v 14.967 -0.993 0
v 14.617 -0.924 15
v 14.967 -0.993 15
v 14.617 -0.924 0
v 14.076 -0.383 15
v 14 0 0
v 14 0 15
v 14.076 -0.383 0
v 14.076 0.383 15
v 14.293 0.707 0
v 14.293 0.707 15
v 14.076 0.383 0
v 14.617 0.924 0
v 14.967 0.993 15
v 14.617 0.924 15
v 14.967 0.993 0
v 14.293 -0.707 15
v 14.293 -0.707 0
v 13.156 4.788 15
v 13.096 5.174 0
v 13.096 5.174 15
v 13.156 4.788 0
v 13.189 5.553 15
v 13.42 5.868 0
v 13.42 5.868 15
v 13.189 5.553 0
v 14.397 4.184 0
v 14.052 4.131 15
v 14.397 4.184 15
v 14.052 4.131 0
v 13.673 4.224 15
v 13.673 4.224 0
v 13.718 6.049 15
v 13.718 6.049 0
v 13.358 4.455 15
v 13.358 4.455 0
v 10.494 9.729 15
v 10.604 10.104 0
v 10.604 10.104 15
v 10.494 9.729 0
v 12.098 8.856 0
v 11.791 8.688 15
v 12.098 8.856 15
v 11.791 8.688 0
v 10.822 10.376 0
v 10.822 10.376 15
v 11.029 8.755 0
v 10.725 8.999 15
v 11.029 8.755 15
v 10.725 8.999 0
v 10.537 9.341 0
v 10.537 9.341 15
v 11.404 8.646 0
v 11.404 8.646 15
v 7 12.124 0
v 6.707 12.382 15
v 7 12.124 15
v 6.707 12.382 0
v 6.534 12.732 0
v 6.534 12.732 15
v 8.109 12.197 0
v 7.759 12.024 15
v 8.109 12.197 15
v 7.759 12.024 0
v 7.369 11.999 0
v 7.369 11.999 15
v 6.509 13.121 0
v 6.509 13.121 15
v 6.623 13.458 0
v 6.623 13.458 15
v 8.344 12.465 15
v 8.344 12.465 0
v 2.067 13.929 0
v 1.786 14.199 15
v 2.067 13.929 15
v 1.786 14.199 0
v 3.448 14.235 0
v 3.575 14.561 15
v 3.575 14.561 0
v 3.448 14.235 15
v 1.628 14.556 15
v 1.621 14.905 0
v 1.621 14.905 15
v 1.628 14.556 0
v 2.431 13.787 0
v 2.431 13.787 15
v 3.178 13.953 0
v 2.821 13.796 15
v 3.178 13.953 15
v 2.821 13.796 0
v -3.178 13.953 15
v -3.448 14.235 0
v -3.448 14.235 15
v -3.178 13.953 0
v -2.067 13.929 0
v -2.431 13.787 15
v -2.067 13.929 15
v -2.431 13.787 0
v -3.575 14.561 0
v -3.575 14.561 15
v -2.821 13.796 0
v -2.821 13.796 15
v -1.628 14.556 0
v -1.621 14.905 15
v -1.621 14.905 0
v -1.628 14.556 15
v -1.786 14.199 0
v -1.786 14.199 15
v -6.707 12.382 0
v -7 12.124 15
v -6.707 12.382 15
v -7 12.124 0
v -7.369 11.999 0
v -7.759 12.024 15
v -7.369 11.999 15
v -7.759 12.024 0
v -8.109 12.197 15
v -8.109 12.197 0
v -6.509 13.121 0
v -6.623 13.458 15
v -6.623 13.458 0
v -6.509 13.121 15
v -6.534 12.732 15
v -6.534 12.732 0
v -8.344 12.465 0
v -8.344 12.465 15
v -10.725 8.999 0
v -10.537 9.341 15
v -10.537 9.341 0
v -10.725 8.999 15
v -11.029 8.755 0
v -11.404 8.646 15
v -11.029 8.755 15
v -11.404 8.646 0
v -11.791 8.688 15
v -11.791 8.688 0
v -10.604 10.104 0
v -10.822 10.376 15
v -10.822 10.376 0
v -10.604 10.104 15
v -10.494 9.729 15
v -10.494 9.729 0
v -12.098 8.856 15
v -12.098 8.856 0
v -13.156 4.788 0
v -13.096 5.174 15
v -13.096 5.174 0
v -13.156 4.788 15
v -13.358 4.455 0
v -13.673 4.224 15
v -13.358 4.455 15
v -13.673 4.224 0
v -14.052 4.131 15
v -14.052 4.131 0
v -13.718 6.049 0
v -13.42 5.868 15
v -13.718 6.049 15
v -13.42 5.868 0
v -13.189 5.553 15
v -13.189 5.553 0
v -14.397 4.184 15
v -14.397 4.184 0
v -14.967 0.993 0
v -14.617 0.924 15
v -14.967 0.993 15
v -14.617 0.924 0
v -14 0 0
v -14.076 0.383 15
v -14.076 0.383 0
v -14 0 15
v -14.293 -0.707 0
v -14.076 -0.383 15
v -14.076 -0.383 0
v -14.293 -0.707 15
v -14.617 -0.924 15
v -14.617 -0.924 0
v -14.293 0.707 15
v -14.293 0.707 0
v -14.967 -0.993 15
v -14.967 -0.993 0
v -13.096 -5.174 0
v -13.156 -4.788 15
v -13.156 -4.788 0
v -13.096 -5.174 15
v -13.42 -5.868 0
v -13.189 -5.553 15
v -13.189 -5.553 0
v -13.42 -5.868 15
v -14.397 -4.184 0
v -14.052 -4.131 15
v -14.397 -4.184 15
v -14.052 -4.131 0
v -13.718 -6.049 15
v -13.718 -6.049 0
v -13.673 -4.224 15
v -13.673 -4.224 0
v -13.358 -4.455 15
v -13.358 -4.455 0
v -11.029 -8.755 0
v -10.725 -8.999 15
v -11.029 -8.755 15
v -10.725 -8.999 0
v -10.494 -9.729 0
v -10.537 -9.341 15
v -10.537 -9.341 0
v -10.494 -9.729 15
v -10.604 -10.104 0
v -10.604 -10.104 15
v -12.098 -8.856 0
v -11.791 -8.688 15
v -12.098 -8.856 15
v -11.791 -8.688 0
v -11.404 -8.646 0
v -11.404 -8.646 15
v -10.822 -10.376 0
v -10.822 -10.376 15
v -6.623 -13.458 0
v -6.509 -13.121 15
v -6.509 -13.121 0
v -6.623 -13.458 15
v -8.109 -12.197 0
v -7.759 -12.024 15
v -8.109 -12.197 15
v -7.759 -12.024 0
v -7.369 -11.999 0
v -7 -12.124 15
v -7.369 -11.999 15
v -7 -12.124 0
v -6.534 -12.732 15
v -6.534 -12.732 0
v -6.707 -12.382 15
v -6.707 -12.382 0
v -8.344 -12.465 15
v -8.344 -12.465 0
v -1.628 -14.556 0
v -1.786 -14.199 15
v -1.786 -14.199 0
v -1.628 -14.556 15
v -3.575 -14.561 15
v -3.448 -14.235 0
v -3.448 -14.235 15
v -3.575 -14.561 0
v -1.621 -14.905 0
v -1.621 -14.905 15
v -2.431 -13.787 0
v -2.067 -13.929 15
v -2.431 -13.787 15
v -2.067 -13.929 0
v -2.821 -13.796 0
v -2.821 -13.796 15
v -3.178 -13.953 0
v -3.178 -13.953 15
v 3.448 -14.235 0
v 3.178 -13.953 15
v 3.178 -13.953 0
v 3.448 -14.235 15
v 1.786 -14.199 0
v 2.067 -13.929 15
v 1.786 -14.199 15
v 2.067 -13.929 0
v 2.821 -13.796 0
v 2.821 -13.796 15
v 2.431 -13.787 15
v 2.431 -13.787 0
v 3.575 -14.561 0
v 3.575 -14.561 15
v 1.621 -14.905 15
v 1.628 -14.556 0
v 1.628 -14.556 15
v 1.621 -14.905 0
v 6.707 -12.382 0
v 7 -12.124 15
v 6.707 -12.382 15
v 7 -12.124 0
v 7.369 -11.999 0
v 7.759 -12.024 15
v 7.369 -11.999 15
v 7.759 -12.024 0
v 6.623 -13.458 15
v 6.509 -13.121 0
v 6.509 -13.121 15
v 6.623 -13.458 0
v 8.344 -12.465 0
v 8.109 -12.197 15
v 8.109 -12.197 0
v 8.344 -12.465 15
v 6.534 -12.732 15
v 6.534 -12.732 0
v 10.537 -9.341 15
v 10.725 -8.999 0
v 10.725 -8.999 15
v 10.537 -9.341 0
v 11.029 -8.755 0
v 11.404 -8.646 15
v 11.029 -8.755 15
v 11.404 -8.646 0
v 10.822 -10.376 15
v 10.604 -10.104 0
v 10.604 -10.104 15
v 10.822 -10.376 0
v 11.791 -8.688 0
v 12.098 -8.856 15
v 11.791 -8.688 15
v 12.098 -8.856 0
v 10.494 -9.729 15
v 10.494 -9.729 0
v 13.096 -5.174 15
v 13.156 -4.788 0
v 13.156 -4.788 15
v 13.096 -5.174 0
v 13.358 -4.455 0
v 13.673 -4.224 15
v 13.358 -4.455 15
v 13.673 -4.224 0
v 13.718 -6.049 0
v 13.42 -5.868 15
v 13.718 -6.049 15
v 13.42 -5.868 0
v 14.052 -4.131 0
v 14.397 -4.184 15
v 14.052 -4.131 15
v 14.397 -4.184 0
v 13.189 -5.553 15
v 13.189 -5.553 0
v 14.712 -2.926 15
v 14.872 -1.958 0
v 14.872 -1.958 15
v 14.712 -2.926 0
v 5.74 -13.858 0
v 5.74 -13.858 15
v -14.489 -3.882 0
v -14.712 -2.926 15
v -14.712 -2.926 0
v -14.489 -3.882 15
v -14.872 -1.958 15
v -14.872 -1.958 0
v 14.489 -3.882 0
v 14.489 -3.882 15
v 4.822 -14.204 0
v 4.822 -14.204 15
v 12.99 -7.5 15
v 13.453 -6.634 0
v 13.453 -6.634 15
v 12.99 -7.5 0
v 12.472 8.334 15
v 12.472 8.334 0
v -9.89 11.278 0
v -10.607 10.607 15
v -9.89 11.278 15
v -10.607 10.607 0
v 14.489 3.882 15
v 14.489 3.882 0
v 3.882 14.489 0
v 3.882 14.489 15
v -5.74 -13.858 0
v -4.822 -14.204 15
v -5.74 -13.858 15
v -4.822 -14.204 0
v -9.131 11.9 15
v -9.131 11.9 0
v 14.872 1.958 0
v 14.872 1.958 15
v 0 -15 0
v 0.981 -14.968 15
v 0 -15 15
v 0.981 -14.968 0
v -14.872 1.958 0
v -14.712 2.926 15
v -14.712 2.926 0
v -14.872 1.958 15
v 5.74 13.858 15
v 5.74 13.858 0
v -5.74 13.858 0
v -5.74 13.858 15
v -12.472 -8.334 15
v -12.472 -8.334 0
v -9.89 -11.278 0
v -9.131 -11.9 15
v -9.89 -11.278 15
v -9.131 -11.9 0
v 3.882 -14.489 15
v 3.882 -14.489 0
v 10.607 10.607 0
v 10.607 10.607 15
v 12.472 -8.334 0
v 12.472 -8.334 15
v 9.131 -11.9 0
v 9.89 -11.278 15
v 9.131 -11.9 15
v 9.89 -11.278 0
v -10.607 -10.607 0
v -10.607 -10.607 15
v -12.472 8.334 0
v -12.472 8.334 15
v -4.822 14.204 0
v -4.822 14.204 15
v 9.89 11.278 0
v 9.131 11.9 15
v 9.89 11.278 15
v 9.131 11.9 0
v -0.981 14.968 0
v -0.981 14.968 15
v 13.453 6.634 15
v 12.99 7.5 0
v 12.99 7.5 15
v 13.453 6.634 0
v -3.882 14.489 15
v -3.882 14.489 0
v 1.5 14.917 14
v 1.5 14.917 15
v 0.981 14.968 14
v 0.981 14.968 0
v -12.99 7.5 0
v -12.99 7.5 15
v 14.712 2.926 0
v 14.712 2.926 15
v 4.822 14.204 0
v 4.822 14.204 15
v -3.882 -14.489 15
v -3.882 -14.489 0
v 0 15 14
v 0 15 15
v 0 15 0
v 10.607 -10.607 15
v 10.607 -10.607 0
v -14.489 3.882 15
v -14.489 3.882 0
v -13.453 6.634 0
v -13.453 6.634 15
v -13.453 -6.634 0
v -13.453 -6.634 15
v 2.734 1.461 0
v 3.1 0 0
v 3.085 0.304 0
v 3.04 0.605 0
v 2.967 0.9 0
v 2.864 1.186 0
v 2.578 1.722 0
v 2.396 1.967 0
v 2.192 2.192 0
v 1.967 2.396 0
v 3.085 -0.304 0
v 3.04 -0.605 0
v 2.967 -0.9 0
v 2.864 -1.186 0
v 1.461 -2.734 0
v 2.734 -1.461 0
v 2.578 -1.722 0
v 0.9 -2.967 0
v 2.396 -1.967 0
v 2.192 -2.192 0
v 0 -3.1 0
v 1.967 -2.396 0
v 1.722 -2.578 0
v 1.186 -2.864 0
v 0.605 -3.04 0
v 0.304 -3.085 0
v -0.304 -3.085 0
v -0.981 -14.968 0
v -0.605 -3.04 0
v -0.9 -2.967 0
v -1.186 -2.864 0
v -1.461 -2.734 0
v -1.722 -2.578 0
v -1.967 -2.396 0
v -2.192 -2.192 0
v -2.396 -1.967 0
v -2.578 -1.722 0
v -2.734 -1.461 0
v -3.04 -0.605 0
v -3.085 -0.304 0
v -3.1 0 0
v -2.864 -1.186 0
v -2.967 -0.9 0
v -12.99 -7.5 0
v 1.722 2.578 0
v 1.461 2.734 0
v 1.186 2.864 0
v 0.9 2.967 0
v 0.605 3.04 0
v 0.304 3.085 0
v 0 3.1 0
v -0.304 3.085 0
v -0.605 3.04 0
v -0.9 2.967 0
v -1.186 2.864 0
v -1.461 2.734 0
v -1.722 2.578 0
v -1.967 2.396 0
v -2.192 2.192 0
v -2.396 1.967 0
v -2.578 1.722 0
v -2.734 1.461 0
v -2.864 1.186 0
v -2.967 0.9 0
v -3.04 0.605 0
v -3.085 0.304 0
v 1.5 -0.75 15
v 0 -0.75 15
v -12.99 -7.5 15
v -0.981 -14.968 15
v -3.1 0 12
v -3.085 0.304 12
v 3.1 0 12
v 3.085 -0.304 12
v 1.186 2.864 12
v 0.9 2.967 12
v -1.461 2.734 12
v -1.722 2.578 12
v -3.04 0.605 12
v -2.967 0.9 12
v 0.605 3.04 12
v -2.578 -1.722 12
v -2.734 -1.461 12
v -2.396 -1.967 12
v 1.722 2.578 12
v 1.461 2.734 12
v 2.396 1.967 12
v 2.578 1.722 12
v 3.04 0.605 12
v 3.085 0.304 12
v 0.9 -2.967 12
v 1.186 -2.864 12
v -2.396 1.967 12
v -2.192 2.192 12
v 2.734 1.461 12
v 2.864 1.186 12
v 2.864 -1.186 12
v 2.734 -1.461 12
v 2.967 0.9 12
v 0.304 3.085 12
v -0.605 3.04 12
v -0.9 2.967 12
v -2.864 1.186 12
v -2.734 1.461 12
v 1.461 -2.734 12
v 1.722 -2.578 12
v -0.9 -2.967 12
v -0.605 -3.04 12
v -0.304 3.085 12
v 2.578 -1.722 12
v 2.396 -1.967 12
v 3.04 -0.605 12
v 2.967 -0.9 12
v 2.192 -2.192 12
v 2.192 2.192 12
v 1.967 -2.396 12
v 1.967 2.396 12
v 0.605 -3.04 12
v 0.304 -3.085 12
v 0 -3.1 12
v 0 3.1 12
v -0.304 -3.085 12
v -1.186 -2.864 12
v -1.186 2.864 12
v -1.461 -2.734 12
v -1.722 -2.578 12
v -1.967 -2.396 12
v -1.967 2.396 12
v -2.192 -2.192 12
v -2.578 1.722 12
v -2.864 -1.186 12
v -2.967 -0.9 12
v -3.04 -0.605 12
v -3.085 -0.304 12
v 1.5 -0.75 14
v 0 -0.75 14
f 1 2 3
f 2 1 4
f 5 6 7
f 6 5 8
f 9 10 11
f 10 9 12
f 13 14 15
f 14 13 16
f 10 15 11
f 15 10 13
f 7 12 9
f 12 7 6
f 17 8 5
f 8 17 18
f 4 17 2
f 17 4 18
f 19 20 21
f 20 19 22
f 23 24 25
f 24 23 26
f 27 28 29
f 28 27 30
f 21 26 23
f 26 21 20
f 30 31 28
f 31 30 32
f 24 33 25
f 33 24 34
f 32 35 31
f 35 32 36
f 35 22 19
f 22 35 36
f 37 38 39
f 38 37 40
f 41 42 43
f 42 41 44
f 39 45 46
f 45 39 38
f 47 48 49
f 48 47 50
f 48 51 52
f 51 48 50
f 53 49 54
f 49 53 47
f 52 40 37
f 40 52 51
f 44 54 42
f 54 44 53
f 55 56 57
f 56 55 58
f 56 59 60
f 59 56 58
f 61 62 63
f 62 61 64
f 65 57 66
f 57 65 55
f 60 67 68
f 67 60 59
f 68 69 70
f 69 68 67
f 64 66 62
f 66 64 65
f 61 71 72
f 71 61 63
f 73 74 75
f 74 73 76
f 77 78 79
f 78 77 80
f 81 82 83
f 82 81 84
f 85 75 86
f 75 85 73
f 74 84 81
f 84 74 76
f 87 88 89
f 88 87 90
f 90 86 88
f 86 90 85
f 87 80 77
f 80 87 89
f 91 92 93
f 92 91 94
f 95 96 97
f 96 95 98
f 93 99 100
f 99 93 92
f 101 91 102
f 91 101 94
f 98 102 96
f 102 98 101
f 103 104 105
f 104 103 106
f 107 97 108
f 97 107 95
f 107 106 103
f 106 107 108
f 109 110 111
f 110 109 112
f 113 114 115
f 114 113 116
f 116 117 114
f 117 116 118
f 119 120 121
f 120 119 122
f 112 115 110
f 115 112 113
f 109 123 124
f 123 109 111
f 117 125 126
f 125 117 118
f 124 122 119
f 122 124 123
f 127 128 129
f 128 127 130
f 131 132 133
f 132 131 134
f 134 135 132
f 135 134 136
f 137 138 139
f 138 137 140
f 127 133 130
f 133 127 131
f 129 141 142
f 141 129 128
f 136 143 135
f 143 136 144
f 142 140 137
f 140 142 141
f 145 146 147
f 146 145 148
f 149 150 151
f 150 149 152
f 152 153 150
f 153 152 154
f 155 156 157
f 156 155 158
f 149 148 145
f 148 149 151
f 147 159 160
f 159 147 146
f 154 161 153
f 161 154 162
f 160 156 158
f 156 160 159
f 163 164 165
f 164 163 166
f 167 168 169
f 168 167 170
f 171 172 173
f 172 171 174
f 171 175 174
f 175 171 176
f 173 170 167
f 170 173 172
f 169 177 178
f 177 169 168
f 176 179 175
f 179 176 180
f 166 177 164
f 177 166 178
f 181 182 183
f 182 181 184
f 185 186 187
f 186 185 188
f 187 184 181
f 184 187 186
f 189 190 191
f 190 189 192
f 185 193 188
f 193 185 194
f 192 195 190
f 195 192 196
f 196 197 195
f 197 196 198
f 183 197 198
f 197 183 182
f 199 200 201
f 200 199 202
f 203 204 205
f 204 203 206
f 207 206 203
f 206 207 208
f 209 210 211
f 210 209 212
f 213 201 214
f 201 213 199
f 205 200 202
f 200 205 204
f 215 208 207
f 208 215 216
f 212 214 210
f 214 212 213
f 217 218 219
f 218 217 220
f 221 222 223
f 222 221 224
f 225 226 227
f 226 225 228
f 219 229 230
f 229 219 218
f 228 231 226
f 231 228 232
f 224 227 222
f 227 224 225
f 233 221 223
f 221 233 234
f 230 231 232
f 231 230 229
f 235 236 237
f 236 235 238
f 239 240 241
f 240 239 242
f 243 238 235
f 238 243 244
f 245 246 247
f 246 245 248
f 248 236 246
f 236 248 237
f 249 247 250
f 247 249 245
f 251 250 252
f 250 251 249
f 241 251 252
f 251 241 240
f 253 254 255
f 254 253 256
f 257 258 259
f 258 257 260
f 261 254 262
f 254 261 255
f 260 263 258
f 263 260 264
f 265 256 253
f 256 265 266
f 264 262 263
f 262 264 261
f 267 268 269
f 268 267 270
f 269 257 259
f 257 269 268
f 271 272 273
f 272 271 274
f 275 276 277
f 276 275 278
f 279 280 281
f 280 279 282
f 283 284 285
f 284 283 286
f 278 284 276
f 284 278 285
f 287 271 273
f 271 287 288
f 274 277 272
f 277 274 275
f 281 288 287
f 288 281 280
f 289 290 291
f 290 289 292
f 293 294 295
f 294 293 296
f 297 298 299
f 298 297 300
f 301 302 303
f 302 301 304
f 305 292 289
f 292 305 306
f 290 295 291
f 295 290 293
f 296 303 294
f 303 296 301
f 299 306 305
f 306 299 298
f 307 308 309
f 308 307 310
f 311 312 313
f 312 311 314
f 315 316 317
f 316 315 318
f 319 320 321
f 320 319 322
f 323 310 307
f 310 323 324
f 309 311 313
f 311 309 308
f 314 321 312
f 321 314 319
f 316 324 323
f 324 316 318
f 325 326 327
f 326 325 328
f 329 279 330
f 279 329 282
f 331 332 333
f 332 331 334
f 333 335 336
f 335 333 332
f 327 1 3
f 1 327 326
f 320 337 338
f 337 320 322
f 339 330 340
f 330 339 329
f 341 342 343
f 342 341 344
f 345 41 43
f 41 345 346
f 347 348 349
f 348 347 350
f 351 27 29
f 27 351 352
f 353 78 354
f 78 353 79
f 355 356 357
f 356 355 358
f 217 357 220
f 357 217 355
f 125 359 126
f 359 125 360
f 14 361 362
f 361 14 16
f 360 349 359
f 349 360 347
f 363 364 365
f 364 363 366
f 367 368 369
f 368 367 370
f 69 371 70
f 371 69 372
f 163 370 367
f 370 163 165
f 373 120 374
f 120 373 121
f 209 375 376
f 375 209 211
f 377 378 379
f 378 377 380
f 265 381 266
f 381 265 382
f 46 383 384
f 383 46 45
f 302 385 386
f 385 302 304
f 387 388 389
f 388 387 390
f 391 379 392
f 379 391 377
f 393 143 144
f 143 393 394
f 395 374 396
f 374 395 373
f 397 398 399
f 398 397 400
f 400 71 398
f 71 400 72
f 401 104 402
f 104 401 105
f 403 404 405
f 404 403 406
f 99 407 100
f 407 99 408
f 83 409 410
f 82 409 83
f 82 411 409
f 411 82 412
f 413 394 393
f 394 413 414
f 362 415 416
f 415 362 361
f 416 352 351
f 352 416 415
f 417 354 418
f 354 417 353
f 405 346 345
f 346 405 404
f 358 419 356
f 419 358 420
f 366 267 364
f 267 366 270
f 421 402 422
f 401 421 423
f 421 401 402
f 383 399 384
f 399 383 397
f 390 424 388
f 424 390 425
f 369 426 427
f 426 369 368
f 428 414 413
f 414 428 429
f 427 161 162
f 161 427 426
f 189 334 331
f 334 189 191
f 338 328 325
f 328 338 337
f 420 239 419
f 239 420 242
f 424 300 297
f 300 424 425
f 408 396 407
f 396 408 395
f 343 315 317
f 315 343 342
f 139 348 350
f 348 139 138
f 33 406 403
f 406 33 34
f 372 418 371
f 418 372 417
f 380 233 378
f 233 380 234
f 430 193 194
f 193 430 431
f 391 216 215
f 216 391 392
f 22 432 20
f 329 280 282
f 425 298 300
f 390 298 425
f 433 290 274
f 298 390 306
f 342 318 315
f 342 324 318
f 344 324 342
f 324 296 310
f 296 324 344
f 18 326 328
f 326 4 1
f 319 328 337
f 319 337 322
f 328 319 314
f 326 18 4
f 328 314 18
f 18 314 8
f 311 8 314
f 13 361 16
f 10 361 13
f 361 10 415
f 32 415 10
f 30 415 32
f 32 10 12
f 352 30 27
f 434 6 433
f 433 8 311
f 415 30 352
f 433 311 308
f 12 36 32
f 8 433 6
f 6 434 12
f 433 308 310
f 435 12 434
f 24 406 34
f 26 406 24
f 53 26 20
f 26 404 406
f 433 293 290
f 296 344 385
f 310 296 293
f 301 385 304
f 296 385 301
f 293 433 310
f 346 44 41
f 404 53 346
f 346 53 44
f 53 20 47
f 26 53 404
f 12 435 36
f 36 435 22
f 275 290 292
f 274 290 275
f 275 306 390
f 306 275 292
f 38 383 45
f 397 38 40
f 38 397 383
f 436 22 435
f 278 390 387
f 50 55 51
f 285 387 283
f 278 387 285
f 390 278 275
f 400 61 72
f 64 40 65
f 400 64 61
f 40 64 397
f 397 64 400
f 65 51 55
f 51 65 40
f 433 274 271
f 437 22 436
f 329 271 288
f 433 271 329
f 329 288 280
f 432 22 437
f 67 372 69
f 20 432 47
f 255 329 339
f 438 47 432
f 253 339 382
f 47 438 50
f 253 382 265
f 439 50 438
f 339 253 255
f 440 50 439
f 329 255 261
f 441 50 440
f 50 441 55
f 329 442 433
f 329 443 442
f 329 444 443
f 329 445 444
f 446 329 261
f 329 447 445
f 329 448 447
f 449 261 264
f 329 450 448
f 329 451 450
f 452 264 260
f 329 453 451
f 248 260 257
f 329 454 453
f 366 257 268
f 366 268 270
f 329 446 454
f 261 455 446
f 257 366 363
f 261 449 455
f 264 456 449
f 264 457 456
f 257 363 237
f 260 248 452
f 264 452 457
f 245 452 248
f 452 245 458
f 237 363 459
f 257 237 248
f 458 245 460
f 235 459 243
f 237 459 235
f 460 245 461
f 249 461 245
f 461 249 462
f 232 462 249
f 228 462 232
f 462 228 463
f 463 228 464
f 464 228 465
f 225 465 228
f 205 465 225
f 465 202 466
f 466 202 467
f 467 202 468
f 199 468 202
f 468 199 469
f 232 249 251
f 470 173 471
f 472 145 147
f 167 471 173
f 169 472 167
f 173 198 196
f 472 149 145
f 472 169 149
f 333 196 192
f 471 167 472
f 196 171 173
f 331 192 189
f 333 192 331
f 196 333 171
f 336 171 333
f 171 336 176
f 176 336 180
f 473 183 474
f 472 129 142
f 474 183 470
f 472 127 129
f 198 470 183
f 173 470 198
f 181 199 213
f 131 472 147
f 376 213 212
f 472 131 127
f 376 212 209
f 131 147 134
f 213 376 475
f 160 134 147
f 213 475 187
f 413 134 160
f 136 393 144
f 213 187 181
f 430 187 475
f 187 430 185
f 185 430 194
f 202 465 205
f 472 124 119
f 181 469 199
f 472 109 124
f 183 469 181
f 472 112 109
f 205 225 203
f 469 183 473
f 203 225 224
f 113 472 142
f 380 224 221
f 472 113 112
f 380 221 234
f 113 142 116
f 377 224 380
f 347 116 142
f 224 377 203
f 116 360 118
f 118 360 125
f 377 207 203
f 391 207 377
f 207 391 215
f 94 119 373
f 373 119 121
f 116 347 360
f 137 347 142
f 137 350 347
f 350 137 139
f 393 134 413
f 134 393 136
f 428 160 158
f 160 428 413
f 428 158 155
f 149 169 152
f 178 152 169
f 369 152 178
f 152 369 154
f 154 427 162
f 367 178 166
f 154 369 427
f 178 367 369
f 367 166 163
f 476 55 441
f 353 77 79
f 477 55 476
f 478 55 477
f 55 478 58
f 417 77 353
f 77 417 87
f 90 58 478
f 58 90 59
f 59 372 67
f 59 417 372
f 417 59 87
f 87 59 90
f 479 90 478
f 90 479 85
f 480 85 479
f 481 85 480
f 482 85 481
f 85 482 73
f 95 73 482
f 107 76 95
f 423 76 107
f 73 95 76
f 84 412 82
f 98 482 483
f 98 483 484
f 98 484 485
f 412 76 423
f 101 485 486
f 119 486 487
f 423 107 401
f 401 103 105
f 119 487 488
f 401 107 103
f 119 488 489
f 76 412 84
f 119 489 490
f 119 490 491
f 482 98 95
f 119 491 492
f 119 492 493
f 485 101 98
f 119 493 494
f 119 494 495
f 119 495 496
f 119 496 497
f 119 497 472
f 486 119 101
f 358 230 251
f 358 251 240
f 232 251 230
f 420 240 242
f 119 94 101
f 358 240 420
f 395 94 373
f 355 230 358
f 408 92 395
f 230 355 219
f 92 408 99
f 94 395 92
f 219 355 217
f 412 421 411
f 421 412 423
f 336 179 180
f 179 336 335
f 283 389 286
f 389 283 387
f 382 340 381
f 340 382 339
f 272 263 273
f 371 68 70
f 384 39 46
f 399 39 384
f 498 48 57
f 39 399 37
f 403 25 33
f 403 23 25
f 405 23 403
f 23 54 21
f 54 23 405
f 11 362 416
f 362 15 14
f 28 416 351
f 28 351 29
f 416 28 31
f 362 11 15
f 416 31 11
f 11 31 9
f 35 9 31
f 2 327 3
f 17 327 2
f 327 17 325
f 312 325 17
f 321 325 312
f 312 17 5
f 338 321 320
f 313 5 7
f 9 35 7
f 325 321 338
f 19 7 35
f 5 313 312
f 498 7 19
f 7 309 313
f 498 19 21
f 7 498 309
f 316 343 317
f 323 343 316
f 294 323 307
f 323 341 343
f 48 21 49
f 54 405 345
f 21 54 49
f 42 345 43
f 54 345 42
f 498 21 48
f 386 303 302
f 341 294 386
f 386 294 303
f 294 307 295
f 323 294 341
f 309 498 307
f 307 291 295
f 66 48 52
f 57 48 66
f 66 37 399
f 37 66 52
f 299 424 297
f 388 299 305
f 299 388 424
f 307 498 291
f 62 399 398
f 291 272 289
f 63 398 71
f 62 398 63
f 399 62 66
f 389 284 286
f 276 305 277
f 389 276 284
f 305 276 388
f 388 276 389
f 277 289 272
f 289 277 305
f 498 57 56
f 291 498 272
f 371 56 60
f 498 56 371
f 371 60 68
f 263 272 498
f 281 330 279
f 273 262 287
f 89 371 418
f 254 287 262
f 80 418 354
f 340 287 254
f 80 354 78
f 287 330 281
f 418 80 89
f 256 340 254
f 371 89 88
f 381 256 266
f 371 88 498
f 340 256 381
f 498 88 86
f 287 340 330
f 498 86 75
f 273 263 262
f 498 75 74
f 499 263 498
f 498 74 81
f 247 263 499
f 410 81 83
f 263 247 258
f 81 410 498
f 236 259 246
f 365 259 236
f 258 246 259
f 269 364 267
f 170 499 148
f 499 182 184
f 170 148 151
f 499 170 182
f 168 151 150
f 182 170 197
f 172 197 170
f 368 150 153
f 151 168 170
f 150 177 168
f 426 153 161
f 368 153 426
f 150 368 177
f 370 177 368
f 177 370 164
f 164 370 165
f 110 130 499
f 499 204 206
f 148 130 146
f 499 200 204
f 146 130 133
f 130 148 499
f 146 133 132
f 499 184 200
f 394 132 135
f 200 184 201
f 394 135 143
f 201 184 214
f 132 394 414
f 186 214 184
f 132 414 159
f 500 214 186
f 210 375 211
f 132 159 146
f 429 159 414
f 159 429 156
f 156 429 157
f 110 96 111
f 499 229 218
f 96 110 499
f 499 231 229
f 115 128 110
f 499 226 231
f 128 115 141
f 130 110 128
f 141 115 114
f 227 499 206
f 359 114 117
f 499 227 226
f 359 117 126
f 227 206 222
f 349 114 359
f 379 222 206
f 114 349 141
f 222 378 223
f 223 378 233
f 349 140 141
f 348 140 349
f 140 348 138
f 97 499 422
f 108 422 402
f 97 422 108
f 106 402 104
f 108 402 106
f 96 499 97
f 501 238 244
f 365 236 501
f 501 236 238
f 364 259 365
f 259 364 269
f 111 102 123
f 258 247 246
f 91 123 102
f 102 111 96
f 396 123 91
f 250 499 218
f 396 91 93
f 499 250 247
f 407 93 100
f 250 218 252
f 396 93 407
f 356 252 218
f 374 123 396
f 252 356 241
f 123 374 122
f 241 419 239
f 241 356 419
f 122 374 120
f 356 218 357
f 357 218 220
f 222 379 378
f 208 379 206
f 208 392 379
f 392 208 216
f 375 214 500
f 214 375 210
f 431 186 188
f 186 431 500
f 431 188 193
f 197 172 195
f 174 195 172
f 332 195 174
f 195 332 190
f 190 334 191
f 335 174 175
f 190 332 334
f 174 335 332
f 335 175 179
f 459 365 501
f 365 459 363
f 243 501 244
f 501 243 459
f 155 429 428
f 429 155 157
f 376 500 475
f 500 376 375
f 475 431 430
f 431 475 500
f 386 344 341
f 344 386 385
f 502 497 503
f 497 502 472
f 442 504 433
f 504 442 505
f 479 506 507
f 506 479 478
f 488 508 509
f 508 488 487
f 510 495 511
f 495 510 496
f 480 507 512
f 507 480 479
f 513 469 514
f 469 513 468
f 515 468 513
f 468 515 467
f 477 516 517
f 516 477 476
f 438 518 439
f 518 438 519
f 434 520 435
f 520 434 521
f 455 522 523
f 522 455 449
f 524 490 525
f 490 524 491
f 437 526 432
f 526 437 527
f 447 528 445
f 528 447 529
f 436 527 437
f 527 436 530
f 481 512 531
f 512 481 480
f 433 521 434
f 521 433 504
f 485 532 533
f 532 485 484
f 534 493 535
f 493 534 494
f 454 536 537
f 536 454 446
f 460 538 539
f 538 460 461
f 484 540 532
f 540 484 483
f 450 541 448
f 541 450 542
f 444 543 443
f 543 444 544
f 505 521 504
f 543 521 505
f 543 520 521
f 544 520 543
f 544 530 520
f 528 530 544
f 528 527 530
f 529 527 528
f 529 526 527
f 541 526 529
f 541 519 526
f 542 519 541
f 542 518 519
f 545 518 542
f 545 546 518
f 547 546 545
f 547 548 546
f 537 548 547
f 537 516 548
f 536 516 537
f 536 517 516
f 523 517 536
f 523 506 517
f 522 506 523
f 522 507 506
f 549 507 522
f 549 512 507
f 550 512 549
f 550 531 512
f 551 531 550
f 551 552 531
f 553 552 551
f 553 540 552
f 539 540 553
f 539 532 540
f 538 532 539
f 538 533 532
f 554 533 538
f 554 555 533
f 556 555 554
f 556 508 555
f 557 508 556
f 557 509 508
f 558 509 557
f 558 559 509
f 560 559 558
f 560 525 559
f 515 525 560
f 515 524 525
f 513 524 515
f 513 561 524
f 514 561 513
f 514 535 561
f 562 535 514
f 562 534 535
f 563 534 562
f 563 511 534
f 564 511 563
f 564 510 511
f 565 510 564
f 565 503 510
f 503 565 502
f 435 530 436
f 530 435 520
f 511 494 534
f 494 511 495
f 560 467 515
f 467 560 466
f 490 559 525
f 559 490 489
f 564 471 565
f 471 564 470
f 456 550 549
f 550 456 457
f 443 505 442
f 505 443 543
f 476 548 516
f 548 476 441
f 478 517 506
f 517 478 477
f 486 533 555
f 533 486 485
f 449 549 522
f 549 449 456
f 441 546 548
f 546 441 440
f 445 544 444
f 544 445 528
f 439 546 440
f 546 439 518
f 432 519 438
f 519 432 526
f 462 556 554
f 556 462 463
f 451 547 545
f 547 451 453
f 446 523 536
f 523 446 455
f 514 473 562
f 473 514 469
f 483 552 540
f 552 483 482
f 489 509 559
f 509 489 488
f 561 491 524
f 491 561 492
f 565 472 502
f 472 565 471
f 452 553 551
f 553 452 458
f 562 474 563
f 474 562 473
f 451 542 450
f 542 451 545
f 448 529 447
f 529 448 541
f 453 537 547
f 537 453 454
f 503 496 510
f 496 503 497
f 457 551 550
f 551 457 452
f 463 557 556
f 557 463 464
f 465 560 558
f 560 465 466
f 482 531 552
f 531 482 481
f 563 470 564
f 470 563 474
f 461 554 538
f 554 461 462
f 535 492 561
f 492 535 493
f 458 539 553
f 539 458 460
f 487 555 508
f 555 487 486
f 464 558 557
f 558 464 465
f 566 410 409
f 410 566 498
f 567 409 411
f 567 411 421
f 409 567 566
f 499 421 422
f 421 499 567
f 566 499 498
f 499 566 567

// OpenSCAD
// Replacement knob for hotplate stirrer with D-shaft
// Print orientation: bottom face (shaft bore) on the bed (z = 0)

// ---------------- Parameters ----------------
knob_d        = 30;    // knob outer diameter
knob_h        = 15;    // knob height
shaft_d       = 6.2;   // D-shaft diameter
bore_depth    = 12;    // blind bore depth from bottom face
bore_flat     = 4.7;   // distance from D-bore flat to opposite side
groove_count  = 18;    // number of grip grooves
groove_d      = 2;     // grip groove diameter
pointer_w     = 1.5;   // pointer groove width
pointer_d     = 1;     // pointer groove depth

eps           = 0.5;   // overshoot for clean boolean cuts
$fn           = 96;    // curve resolution

// ---------------- Model ----------------
difference() {
    // Main body
    cylinder(d = knob_d, h = knob_h);

    // D-shaped blind bore from bottom face
    translate([0, 0, -eps])
        cylinder(d = shaft_d, h = bore_depth + eps, $fn = 64);
    // flatten one side of the D so the distance from the flat to the
    // opposite side is exactly bore_flat
    translate([-(shaft_d / 2 - bore_flat / 2), -bore_flat / 2, -eps])
        cube([shaft_d - bore_flat, bore_flat, bore_depth + eps]);

    // Vertical grip grooves around the full height
    for (i = [0 : groove_count - 1])
        rotate([0, 0, i * 360 / groove_count])
            translate([knob_d / 2, 0, -eps])
                cylinder(d = groove_d, h = knob_h + 2 * eps, $fn = 16);

    // Pointer groove from centre to outer edge on the flat side
    translate([0, -pointer_w / 2, knob_h - pointer_d])
        cube([pointer_w, knob_d / 2 + 1, pointer_d]);
}
